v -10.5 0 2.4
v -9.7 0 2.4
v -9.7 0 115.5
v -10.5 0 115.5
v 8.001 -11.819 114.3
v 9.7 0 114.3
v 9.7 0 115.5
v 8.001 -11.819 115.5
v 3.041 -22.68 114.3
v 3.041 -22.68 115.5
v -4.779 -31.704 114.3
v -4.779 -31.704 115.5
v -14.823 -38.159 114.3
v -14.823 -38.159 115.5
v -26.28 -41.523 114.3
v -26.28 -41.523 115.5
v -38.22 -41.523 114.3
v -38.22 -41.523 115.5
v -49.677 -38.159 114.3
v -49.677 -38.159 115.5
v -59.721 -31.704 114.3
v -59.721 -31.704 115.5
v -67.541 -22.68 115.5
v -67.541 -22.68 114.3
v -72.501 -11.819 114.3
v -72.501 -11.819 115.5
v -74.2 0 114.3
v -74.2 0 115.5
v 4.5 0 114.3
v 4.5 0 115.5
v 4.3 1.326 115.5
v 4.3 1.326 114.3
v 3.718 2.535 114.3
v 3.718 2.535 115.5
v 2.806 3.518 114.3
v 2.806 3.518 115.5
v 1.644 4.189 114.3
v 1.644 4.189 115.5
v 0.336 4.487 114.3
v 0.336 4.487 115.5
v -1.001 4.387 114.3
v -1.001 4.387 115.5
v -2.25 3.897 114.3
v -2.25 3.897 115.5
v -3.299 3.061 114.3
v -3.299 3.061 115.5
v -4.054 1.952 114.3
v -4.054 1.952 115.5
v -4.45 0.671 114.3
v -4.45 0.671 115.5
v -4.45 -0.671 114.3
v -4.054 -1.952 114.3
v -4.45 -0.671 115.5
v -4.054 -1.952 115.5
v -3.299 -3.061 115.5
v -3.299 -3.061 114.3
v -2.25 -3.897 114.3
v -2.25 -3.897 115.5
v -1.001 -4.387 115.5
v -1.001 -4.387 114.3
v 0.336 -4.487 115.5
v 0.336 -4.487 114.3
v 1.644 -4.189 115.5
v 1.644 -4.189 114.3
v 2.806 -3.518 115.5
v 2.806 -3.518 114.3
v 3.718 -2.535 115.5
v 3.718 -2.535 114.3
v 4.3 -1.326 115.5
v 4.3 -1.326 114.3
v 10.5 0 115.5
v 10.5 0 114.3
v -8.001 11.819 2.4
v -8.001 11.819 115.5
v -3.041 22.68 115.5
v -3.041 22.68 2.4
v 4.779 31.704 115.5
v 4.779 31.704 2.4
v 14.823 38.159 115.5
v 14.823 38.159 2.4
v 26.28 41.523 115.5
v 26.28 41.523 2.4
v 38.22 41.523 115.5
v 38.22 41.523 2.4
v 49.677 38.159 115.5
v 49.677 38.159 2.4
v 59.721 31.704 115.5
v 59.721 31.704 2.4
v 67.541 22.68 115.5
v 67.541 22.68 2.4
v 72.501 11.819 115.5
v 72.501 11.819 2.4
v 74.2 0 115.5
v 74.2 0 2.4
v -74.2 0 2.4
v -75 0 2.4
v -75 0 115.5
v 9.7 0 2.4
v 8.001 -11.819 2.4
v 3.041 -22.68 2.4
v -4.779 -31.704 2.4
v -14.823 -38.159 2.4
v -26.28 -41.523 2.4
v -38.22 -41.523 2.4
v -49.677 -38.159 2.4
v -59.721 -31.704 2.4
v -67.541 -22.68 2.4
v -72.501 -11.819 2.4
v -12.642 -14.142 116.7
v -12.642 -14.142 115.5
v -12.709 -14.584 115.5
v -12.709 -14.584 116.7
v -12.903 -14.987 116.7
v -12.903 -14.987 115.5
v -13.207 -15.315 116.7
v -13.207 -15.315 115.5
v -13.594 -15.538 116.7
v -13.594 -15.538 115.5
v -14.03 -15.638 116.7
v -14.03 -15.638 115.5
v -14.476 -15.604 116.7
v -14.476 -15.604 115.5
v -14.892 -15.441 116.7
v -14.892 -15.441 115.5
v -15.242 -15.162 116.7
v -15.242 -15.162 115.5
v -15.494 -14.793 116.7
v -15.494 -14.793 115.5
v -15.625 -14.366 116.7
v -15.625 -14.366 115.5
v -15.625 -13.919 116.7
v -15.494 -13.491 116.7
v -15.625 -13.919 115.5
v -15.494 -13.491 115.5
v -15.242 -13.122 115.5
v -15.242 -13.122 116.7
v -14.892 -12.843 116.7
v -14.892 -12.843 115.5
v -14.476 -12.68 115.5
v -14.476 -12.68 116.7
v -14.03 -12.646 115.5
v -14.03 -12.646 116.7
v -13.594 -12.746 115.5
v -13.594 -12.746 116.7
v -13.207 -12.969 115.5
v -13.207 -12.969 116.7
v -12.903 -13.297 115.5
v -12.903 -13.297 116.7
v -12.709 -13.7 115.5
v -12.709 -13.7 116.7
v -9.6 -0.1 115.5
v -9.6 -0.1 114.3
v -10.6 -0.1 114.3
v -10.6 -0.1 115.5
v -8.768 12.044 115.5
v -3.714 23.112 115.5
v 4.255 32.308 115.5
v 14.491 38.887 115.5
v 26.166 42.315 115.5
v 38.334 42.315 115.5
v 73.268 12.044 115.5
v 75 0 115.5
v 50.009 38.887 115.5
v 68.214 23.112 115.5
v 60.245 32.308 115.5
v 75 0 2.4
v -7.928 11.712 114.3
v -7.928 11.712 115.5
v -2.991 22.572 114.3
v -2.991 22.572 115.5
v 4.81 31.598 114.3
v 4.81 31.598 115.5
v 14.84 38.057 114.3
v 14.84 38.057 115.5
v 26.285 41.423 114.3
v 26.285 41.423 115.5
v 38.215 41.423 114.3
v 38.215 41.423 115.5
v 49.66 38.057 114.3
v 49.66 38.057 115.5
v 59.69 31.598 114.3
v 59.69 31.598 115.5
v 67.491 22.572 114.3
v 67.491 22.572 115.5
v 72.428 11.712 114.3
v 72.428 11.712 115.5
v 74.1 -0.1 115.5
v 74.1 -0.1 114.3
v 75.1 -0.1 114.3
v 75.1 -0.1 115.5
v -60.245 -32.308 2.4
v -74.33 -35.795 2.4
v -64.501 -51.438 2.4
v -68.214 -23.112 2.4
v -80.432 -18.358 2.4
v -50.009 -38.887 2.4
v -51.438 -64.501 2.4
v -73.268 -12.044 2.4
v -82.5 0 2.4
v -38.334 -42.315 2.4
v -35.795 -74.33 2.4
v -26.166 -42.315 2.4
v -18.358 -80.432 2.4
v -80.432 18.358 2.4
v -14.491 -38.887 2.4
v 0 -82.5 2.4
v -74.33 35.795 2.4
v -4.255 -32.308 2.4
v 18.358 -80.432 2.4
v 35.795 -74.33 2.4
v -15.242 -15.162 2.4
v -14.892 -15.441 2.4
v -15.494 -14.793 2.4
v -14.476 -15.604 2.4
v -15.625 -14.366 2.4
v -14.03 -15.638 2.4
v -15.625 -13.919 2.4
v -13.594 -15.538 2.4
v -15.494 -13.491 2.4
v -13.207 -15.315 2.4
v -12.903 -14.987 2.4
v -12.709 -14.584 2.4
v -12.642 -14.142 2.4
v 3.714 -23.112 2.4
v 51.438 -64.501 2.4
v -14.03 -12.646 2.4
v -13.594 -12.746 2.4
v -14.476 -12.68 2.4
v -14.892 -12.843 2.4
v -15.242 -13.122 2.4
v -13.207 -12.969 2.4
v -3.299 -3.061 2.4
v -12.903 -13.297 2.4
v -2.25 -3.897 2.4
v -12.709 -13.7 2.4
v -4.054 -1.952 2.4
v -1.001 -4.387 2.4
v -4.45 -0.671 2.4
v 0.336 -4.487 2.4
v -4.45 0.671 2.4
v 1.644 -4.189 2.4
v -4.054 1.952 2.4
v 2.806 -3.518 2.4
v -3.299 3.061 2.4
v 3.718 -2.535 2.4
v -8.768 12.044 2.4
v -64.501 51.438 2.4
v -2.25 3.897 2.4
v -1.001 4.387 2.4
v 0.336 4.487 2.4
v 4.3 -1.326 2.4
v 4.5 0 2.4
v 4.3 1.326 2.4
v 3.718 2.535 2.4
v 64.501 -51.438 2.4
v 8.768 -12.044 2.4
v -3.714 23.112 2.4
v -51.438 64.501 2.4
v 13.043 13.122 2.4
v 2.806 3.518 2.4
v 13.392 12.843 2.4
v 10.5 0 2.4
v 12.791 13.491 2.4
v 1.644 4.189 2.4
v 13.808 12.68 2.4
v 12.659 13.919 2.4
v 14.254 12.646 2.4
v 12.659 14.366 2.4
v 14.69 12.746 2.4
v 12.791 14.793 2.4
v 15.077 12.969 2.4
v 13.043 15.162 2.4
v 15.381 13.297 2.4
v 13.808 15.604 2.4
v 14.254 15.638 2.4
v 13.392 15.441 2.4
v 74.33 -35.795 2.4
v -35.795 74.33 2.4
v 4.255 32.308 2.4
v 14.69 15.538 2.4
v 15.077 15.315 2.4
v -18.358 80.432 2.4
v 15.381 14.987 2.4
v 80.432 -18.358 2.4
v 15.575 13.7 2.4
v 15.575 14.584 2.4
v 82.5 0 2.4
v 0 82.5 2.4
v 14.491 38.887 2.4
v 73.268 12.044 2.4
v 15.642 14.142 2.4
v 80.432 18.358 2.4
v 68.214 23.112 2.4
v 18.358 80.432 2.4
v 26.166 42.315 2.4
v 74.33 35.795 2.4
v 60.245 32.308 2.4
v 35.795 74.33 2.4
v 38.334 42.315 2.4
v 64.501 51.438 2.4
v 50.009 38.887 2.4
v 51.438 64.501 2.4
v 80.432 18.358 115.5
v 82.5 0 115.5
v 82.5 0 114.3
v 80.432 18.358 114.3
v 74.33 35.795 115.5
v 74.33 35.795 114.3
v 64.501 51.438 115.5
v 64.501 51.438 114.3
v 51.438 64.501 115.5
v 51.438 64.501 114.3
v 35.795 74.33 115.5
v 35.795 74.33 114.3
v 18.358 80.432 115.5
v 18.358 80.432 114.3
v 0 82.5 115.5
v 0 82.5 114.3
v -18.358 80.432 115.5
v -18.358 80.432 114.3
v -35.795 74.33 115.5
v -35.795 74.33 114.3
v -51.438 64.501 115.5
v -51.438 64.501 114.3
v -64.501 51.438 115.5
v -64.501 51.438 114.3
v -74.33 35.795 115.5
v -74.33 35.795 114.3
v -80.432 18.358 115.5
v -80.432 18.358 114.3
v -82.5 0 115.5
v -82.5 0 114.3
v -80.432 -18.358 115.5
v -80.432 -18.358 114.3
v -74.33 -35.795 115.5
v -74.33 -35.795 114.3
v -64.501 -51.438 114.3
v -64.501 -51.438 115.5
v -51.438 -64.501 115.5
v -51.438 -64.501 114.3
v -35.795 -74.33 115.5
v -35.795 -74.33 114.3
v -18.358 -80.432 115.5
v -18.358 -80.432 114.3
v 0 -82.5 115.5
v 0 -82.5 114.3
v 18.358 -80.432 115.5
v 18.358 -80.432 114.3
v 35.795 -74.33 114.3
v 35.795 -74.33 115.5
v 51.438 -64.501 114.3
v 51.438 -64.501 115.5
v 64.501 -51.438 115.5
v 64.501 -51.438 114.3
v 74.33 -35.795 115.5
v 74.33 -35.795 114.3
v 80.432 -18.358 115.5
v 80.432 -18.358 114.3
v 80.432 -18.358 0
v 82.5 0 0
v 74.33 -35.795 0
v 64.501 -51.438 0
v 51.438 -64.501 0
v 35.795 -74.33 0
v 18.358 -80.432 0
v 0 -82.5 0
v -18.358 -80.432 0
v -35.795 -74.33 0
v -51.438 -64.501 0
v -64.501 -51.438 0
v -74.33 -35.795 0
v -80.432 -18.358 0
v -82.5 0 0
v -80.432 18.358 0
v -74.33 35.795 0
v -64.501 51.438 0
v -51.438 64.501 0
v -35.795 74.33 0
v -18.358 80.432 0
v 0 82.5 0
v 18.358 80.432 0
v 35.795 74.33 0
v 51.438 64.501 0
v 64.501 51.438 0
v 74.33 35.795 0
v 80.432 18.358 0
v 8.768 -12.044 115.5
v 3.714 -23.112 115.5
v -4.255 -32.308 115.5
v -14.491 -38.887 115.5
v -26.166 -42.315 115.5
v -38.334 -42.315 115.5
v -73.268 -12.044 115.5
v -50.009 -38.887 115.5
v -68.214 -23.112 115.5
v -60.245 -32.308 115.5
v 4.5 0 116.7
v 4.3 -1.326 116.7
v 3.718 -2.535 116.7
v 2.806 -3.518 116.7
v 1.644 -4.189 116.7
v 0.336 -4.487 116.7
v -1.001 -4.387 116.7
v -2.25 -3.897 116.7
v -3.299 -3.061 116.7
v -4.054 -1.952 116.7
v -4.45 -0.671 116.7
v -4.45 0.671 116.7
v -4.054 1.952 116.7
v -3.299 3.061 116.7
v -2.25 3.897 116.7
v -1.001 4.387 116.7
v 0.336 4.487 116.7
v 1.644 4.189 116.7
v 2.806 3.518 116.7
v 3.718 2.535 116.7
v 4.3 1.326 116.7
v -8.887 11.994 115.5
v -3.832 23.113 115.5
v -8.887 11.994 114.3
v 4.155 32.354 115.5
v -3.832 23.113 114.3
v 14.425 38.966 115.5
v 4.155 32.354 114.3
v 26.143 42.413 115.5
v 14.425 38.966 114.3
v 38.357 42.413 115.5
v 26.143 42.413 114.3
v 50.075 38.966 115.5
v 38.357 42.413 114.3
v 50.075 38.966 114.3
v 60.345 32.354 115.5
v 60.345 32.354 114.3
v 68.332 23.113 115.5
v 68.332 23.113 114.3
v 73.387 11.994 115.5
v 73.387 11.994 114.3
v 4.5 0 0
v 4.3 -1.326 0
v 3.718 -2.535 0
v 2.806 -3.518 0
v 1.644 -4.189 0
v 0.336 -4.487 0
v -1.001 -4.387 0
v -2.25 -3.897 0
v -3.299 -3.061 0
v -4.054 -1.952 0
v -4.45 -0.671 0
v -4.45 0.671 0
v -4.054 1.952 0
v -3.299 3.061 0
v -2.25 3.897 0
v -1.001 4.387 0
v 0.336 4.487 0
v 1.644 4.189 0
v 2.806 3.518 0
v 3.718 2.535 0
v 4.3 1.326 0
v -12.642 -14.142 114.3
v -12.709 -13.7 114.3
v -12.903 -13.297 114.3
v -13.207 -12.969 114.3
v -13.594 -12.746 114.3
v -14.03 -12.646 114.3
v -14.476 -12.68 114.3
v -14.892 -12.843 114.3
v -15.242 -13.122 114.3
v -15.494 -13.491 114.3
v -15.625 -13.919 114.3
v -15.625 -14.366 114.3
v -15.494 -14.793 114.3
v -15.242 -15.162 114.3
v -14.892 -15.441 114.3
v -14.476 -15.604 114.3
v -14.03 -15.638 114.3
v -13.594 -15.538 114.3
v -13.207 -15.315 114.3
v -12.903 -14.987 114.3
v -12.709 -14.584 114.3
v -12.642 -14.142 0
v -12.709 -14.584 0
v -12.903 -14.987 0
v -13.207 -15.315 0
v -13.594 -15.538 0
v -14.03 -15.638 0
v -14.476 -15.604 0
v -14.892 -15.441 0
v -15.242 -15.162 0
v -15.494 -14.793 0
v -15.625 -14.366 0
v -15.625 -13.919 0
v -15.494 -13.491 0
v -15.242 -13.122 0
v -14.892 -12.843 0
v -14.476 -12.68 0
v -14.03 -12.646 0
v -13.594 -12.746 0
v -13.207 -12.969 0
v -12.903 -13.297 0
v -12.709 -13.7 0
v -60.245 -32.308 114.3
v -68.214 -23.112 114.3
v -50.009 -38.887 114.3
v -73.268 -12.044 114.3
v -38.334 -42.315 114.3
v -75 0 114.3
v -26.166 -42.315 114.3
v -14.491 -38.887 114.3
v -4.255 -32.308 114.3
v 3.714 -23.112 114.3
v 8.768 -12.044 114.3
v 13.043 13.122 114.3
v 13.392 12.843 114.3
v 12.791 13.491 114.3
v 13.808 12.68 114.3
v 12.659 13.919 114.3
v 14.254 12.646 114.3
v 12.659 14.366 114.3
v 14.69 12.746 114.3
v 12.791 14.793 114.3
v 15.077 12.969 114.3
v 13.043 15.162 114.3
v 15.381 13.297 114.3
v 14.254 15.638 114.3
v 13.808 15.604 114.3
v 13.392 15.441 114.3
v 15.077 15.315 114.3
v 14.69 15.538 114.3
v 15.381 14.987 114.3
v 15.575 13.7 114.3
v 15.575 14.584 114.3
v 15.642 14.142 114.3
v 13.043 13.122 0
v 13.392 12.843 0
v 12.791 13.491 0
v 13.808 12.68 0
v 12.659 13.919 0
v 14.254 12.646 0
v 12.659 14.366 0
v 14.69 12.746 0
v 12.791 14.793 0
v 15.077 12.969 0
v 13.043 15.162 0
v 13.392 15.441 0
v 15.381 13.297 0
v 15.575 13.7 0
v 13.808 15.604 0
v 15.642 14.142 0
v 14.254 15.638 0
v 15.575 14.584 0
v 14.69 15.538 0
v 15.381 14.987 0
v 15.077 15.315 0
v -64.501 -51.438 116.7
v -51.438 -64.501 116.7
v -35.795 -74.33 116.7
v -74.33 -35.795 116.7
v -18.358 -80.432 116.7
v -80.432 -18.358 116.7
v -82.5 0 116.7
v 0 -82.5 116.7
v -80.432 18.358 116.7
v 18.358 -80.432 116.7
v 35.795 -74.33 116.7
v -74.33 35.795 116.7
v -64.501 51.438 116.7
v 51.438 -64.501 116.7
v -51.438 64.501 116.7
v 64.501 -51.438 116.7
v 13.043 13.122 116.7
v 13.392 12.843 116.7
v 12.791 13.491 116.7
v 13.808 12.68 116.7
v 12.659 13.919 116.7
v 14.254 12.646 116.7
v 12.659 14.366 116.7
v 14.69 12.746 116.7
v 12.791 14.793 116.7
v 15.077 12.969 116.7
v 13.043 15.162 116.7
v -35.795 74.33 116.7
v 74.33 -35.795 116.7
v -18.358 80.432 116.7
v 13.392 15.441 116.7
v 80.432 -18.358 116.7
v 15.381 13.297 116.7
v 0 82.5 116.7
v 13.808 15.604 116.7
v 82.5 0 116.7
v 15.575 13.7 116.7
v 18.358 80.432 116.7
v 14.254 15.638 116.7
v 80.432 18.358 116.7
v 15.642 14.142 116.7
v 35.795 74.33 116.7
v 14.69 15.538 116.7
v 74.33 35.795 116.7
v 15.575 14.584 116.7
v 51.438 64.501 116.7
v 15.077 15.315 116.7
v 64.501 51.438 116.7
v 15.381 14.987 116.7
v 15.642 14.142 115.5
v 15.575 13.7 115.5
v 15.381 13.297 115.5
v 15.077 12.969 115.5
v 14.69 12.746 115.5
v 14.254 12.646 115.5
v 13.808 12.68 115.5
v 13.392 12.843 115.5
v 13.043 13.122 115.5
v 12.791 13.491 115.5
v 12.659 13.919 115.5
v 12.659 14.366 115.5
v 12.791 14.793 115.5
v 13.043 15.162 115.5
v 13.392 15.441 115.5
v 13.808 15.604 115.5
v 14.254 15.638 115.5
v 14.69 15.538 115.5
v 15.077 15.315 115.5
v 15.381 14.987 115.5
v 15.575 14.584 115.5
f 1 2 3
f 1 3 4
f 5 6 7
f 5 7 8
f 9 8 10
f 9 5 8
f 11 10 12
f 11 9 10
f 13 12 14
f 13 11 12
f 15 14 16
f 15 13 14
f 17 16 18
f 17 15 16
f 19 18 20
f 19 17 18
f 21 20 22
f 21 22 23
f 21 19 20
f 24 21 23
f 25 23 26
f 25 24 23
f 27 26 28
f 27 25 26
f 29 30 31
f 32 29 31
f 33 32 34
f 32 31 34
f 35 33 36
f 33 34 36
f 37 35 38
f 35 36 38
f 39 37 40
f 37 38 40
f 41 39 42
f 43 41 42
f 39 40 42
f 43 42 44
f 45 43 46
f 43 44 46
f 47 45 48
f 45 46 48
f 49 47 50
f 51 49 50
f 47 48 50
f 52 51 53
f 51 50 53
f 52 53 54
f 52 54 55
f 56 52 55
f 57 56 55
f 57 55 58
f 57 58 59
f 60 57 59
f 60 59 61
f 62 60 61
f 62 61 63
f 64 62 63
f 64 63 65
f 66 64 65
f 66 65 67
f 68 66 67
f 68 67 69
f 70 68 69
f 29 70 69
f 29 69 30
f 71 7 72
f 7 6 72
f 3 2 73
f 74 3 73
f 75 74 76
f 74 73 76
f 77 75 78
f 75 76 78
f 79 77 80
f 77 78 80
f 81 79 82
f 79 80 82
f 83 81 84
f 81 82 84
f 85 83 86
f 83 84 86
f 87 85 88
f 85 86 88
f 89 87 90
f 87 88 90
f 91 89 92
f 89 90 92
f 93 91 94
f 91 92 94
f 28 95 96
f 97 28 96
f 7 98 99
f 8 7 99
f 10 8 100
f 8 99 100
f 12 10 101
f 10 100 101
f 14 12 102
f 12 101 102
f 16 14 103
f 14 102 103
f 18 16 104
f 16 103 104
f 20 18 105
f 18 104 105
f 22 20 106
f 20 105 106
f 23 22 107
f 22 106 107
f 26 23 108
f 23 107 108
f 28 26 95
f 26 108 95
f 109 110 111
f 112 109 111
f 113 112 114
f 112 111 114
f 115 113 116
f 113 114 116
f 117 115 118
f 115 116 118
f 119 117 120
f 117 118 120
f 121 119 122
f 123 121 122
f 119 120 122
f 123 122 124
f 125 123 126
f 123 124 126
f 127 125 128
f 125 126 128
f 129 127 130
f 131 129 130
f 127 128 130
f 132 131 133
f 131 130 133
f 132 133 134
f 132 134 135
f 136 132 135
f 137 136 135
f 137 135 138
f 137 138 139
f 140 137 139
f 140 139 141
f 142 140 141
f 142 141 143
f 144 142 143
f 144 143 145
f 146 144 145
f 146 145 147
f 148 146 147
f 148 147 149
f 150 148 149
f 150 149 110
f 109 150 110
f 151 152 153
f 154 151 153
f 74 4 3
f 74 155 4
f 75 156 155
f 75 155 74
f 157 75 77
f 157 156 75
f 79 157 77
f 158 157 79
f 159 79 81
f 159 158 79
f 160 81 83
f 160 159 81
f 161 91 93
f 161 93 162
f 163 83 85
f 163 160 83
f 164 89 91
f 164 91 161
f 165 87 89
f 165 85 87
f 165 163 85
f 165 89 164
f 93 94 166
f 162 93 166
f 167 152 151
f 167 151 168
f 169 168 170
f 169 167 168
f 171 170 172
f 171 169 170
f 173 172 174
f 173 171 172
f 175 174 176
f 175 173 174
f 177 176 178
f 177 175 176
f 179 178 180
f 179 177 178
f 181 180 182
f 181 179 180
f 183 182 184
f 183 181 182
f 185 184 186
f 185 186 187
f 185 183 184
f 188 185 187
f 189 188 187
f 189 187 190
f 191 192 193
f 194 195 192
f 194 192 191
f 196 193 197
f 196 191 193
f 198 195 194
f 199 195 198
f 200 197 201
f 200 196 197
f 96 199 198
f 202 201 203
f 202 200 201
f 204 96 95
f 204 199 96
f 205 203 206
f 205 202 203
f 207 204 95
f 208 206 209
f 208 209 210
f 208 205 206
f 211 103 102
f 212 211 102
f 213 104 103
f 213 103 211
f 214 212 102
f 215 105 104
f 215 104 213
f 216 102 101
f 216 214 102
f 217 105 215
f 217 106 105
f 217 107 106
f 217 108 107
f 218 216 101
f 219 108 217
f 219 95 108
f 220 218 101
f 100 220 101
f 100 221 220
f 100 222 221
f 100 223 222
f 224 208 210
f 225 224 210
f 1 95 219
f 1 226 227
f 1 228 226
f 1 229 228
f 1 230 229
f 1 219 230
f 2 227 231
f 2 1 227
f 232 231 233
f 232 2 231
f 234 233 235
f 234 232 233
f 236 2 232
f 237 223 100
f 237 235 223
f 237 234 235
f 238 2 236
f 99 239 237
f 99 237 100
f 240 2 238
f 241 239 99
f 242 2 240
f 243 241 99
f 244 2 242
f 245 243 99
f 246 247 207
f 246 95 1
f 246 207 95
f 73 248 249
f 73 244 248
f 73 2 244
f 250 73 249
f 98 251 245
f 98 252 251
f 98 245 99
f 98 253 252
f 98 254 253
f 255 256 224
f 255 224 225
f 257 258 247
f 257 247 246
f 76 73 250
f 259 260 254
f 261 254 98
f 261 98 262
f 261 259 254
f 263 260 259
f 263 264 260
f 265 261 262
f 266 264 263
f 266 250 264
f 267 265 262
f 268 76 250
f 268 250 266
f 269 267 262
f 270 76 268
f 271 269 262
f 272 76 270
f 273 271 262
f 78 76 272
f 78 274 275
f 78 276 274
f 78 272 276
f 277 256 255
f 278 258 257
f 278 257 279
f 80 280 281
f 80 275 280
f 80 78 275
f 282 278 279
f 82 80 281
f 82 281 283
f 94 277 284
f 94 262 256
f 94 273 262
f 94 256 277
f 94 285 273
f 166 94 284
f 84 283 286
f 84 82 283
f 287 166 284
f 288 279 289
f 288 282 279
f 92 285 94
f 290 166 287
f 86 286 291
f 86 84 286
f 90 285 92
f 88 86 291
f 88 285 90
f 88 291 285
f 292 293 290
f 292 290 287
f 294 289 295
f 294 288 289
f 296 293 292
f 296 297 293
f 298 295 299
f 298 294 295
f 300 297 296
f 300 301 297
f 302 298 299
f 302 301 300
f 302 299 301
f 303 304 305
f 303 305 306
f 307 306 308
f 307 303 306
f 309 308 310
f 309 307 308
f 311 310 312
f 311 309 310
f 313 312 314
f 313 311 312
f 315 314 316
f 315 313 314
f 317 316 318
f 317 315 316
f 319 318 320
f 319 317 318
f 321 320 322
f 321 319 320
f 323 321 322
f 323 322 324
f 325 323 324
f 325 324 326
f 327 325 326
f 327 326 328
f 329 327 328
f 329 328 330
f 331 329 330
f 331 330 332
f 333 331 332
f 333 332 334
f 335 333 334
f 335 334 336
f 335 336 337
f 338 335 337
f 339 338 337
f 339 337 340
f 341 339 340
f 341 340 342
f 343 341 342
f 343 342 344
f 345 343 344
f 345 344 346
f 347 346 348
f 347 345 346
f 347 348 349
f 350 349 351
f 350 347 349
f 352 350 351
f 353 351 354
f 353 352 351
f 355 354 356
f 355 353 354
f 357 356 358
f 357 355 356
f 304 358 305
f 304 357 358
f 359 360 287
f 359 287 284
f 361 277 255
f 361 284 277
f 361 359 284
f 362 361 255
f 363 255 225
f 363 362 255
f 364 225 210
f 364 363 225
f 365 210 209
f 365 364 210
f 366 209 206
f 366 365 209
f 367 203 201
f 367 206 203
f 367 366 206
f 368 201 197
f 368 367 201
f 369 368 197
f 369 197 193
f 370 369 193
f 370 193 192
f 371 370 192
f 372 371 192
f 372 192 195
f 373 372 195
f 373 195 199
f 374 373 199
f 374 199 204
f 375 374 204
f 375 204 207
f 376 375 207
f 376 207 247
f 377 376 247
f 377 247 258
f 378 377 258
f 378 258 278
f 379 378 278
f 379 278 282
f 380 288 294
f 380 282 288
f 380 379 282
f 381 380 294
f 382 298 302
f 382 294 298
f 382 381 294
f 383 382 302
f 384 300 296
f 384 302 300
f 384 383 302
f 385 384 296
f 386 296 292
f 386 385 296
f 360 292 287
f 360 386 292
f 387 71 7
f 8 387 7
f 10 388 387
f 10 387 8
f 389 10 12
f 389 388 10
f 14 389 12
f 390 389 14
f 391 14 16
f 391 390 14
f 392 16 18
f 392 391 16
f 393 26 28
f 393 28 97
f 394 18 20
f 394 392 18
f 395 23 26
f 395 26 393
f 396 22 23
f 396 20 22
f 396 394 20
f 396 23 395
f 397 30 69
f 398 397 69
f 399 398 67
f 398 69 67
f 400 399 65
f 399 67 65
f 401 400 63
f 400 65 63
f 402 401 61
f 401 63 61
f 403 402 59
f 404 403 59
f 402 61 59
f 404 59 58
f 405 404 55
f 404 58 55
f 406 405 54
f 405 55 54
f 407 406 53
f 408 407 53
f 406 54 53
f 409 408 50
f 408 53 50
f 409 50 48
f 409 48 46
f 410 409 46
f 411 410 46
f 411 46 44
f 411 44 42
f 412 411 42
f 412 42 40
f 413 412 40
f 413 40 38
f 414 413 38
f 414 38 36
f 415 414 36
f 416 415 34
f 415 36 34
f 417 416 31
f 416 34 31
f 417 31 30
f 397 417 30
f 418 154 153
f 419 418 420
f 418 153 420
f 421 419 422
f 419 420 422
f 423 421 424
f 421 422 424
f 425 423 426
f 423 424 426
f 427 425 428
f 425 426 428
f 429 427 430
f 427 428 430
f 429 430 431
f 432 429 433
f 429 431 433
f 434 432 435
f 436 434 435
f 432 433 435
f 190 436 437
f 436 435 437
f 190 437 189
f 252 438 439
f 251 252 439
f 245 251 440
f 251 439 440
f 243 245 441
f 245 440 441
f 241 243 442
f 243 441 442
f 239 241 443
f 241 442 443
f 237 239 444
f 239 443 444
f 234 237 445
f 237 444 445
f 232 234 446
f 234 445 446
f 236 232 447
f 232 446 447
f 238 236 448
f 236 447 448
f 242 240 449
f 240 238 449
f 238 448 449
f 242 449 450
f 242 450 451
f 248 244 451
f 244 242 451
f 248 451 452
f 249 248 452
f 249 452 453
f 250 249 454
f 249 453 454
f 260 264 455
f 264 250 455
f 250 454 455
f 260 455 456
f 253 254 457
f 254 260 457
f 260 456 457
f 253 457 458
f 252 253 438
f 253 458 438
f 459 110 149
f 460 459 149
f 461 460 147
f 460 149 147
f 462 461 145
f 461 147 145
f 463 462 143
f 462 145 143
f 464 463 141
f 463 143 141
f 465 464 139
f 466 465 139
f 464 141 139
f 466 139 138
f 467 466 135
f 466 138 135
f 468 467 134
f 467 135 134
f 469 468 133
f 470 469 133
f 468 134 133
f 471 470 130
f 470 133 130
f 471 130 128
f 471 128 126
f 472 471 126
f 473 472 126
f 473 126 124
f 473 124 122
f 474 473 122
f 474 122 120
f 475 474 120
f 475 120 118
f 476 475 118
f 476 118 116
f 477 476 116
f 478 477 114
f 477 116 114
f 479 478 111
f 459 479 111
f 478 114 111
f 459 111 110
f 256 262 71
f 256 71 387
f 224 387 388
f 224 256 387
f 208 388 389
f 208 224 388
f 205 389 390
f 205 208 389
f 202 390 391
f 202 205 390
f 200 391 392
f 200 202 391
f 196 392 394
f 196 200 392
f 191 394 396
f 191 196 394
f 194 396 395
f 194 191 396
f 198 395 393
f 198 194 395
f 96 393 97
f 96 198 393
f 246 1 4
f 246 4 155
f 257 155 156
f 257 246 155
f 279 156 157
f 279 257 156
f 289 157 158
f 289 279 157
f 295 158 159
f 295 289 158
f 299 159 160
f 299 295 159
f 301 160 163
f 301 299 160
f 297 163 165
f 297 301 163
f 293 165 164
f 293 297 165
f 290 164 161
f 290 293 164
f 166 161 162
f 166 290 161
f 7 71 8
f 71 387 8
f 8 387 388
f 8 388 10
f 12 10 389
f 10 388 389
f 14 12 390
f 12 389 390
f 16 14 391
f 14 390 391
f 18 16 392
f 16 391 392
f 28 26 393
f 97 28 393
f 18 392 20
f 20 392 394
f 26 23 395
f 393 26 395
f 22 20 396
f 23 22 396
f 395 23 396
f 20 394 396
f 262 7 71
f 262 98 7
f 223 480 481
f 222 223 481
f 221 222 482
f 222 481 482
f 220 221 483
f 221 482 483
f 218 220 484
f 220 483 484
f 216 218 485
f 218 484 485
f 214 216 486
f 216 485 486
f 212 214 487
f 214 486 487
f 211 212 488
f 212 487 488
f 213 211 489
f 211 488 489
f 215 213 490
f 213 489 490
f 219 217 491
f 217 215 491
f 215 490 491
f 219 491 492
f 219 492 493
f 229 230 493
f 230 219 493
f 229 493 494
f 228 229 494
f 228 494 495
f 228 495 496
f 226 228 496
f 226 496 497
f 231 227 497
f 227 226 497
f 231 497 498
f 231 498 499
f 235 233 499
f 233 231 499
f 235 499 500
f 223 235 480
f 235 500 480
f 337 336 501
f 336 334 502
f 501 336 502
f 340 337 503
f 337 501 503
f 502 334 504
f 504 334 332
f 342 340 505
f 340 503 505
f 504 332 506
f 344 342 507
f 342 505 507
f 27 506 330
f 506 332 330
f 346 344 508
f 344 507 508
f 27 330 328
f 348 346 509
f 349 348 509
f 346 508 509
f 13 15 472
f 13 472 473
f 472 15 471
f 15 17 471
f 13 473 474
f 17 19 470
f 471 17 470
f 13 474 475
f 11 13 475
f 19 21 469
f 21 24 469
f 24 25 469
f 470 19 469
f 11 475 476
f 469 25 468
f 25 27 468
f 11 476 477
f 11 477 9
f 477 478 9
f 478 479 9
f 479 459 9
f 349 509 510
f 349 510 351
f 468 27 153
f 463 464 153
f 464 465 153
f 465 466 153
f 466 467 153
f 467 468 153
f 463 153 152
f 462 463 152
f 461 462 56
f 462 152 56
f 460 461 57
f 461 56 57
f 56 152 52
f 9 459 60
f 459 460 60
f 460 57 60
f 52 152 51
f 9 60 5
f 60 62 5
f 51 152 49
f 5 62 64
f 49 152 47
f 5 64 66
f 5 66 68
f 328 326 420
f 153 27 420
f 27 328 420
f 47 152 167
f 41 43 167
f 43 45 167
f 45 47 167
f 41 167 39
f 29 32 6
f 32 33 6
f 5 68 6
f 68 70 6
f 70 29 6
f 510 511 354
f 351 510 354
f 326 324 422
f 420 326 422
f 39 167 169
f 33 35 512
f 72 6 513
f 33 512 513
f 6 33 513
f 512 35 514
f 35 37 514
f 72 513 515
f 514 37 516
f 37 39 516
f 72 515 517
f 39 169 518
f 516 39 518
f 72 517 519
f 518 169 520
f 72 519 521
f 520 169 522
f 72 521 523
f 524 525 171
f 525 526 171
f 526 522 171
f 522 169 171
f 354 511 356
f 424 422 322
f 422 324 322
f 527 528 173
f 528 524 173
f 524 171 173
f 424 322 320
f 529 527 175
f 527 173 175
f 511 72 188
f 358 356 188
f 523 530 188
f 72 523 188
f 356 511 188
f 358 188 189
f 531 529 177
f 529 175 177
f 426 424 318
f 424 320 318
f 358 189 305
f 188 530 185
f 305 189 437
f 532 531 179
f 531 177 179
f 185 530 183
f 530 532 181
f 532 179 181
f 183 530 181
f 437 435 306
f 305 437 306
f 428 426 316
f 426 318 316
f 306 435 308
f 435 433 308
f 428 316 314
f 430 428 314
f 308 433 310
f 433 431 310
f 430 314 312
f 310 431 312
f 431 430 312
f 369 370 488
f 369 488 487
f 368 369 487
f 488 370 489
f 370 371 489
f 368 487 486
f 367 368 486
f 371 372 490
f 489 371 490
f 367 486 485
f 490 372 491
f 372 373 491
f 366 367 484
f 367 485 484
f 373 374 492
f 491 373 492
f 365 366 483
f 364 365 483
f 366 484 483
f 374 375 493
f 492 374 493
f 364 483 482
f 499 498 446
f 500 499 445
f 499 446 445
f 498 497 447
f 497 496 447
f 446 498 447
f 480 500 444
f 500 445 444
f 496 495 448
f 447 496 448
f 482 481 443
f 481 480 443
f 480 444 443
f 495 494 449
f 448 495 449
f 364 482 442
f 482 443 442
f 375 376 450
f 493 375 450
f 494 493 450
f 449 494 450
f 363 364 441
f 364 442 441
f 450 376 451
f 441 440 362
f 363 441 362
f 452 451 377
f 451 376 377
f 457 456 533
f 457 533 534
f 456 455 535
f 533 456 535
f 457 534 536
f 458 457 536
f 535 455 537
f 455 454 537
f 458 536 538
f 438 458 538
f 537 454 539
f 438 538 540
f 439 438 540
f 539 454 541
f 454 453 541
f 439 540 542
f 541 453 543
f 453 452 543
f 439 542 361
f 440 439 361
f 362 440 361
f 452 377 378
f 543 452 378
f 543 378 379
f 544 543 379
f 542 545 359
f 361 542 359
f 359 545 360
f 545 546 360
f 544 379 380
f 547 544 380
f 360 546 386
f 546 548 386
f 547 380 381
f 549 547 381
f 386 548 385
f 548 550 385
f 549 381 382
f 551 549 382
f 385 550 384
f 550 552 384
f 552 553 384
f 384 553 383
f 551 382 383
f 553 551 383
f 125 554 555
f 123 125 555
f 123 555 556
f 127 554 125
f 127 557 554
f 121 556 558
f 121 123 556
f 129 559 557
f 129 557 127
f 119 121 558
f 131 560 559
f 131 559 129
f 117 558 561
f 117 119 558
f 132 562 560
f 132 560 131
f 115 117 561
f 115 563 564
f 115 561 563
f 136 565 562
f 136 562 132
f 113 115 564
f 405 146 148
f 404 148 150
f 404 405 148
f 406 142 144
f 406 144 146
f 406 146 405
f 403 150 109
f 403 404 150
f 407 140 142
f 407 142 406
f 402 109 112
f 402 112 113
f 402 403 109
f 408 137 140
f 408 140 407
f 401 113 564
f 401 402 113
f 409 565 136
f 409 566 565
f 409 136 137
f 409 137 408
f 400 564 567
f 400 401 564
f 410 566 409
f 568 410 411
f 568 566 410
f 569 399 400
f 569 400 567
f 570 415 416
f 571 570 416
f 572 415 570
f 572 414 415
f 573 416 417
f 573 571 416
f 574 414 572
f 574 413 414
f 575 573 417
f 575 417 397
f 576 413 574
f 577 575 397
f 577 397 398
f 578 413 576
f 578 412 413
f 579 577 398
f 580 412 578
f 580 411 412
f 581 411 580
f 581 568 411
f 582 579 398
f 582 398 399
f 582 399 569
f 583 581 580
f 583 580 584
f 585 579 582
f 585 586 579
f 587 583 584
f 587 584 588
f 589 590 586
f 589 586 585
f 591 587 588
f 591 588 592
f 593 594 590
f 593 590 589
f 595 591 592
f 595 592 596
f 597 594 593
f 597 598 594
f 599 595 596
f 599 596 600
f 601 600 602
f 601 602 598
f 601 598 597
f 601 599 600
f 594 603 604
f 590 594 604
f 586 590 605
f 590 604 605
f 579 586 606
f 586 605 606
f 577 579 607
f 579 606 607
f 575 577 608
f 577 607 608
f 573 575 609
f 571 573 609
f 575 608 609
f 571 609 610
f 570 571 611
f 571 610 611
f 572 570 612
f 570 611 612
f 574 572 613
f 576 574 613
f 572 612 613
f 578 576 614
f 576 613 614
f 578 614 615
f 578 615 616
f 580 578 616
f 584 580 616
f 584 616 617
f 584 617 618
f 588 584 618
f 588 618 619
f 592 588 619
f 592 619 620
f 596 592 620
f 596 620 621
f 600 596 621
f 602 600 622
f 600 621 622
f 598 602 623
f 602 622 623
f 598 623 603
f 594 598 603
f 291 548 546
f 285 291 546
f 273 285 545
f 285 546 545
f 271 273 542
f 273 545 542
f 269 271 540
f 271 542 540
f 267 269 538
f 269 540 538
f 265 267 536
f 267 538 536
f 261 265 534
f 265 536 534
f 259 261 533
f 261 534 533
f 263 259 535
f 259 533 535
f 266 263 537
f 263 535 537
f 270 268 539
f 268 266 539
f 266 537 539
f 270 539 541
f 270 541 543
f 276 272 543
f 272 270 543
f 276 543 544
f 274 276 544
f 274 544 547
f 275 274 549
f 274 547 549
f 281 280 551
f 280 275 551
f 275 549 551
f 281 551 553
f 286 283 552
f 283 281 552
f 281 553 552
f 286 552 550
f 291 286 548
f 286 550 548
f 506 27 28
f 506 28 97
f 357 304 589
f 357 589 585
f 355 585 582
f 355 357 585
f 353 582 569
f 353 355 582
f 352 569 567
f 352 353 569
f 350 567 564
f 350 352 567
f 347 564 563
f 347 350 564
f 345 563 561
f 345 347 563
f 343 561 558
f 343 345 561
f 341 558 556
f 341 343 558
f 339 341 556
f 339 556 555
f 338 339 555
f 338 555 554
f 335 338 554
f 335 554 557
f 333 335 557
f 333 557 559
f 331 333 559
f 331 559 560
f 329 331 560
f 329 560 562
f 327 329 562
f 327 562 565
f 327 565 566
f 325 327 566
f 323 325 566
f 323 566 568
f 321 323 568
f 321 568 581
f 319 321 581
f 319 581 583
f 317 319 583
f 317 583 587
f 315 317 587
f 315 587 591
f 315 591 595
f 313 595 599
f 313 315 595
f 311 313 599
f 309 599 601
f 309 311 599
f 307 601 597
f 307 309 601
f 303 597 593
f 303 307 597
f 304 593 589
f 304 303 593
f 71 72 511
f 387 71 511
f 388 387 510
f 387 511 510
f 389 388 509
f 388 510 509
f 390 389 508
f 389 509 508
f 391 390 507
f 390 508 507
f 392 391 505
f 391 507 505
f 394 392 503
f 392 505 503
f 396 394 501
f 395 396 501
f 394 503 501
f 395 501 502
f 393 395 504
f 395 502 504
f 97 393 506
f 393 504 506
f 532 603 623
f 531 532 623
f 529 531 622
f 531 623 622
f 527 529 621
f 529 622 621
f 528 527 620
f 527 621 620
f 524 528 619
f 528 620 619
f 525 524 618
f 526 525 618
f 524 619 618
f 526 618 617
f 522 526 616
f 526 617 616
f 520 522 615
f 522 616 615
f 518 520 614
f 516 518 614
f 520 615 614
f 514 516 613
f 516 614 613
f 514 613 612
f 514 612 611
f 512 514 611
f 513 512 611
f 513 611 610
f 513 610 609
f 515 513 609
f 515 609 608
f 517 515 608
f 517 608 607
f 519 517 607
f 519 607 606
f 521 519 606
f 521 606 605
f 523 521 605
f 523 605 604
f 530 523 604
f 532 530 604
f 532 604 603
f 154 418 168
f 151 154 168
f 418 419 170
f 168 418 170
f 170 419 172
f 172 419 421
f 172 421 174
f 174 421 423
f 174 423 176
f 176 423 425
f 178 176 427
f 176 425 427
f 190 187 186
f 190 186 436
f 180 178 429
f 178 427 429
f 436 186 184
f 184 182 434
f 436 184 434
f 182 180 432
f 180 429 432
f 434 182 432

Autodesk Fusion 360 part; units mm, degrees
sketch "Turbine Blade" plane through (0, 0, 0) normal (0, 0, 1) x (1, 0, 0) in component "Savonius Turbine"
  circle A0 centre (0, 0) radius 10.5 construction
  line L0 (0, 0) -> (-10.5, 0) construction
  line L1 (-10.5, 0) -> (75, 0) construction
  arc A1 (75, 0) -> (-10.5, 0) centre (32.25, 0) ccw
  arc A2 (74.2, 0) -> (-9.7, 0) centre (32.25, 0) ccw
  line L2 (74.2, 0) -> (75, 0)
  line L3 (-10.5, 0) -> (-9.7, 0) construction
  line L4 (-9.7, 0) -> (-10.5, 0)
  dimension "d57" = 21
  dimension "d59" = 75
extrude "Extrude5" add sketch "Turbine Blade" along normal blind 115.5 makes body 1 in component "Savonius Turbine"
pattern_circular "C-Pattern1" count 2 over 360 about axis through (0, 0, 1.75) along (0, 0, 1) of bodies 1 makes body 2 in component "Savonius Turbine"
sketch "EndPlates" plane through (0, 0, 0) normal (0, 0, 1) x (1, 0, 0) in component "Savonius Turbine"
  circle A0 centre (0, 0) radius 82.5
  line L0 (14.1421, 14.1421) -> (-14.1421, -14.1421) construction
  circle A1 centre (14.1421, 14.1421) radius 1.5
  circle A2 centre (-14.1421, -14.1421) radius 1.5
  line L1 (20, 0) -> (2.5, 0)
  circle A3 centre (0, 0) radius 4.5
  dimension "d65" = 165
  dimension "d68" = 40
  dimension "d69" = 3
  dimension "d70" = 3
  dimension "d71" = 45
  dimension "d72" = 9
extrude "Extrude6" add sketch "EndPlates" along normal blind 2.4 separate body makes body 3 in component "Savonius Turbine"
extrude "Extrude7" add sketch "EndPlates" along normal mid plane 2.4 from surface at 115.5 separate body makes body 4 in component "Savonius Turbine"
combine "Combine1" operation cut target body 4 tool bodies 1 2 keep tools in component "Savonius Turbine"
combine "Combine2" operation add target body 3 tool bodies 2 1 in component "Savonius Turbine"
move_face "OffsetFaces1" offset -0.1 8 faces at (73.9915, 4.1769, 114.7) (73.9915, 4.1769, 114.7) (-9.9667, 0, 114.7) (74.7876, 4.2565, 114.7) (-9.9667, 0, 114.7) (74.7876, 4.2565, 114.7) (74.4667, 0, 114.7) (74.4667, 0, 114.7) on bodies 4 in component "Savonius Turbine"
component "Savonius Turbine" placed x (1, 0, 0) y (0, 1, 0) z (0, 0, 1) at (0, 0, 0)
equation "Width = 150 mm"
equation "Height = Width * AspectRatio"
equation "Overlap = OverlapPercent * Width"
equation "BladeDiameter = ( Width + Overlap ) / 2"
equation "BladeThickness = 0.8 mm"
equation "BaseThickness = 2.4 mm"
equation "d57 = Overlap"
equation "d59 = Width / 2"
equation "d61 = Height"
equation "d65 = Width * BaseRatio"
equation "d66 = BaseThickness"
equation "d73 = Height"
equation "d74 = BaseThickness"
